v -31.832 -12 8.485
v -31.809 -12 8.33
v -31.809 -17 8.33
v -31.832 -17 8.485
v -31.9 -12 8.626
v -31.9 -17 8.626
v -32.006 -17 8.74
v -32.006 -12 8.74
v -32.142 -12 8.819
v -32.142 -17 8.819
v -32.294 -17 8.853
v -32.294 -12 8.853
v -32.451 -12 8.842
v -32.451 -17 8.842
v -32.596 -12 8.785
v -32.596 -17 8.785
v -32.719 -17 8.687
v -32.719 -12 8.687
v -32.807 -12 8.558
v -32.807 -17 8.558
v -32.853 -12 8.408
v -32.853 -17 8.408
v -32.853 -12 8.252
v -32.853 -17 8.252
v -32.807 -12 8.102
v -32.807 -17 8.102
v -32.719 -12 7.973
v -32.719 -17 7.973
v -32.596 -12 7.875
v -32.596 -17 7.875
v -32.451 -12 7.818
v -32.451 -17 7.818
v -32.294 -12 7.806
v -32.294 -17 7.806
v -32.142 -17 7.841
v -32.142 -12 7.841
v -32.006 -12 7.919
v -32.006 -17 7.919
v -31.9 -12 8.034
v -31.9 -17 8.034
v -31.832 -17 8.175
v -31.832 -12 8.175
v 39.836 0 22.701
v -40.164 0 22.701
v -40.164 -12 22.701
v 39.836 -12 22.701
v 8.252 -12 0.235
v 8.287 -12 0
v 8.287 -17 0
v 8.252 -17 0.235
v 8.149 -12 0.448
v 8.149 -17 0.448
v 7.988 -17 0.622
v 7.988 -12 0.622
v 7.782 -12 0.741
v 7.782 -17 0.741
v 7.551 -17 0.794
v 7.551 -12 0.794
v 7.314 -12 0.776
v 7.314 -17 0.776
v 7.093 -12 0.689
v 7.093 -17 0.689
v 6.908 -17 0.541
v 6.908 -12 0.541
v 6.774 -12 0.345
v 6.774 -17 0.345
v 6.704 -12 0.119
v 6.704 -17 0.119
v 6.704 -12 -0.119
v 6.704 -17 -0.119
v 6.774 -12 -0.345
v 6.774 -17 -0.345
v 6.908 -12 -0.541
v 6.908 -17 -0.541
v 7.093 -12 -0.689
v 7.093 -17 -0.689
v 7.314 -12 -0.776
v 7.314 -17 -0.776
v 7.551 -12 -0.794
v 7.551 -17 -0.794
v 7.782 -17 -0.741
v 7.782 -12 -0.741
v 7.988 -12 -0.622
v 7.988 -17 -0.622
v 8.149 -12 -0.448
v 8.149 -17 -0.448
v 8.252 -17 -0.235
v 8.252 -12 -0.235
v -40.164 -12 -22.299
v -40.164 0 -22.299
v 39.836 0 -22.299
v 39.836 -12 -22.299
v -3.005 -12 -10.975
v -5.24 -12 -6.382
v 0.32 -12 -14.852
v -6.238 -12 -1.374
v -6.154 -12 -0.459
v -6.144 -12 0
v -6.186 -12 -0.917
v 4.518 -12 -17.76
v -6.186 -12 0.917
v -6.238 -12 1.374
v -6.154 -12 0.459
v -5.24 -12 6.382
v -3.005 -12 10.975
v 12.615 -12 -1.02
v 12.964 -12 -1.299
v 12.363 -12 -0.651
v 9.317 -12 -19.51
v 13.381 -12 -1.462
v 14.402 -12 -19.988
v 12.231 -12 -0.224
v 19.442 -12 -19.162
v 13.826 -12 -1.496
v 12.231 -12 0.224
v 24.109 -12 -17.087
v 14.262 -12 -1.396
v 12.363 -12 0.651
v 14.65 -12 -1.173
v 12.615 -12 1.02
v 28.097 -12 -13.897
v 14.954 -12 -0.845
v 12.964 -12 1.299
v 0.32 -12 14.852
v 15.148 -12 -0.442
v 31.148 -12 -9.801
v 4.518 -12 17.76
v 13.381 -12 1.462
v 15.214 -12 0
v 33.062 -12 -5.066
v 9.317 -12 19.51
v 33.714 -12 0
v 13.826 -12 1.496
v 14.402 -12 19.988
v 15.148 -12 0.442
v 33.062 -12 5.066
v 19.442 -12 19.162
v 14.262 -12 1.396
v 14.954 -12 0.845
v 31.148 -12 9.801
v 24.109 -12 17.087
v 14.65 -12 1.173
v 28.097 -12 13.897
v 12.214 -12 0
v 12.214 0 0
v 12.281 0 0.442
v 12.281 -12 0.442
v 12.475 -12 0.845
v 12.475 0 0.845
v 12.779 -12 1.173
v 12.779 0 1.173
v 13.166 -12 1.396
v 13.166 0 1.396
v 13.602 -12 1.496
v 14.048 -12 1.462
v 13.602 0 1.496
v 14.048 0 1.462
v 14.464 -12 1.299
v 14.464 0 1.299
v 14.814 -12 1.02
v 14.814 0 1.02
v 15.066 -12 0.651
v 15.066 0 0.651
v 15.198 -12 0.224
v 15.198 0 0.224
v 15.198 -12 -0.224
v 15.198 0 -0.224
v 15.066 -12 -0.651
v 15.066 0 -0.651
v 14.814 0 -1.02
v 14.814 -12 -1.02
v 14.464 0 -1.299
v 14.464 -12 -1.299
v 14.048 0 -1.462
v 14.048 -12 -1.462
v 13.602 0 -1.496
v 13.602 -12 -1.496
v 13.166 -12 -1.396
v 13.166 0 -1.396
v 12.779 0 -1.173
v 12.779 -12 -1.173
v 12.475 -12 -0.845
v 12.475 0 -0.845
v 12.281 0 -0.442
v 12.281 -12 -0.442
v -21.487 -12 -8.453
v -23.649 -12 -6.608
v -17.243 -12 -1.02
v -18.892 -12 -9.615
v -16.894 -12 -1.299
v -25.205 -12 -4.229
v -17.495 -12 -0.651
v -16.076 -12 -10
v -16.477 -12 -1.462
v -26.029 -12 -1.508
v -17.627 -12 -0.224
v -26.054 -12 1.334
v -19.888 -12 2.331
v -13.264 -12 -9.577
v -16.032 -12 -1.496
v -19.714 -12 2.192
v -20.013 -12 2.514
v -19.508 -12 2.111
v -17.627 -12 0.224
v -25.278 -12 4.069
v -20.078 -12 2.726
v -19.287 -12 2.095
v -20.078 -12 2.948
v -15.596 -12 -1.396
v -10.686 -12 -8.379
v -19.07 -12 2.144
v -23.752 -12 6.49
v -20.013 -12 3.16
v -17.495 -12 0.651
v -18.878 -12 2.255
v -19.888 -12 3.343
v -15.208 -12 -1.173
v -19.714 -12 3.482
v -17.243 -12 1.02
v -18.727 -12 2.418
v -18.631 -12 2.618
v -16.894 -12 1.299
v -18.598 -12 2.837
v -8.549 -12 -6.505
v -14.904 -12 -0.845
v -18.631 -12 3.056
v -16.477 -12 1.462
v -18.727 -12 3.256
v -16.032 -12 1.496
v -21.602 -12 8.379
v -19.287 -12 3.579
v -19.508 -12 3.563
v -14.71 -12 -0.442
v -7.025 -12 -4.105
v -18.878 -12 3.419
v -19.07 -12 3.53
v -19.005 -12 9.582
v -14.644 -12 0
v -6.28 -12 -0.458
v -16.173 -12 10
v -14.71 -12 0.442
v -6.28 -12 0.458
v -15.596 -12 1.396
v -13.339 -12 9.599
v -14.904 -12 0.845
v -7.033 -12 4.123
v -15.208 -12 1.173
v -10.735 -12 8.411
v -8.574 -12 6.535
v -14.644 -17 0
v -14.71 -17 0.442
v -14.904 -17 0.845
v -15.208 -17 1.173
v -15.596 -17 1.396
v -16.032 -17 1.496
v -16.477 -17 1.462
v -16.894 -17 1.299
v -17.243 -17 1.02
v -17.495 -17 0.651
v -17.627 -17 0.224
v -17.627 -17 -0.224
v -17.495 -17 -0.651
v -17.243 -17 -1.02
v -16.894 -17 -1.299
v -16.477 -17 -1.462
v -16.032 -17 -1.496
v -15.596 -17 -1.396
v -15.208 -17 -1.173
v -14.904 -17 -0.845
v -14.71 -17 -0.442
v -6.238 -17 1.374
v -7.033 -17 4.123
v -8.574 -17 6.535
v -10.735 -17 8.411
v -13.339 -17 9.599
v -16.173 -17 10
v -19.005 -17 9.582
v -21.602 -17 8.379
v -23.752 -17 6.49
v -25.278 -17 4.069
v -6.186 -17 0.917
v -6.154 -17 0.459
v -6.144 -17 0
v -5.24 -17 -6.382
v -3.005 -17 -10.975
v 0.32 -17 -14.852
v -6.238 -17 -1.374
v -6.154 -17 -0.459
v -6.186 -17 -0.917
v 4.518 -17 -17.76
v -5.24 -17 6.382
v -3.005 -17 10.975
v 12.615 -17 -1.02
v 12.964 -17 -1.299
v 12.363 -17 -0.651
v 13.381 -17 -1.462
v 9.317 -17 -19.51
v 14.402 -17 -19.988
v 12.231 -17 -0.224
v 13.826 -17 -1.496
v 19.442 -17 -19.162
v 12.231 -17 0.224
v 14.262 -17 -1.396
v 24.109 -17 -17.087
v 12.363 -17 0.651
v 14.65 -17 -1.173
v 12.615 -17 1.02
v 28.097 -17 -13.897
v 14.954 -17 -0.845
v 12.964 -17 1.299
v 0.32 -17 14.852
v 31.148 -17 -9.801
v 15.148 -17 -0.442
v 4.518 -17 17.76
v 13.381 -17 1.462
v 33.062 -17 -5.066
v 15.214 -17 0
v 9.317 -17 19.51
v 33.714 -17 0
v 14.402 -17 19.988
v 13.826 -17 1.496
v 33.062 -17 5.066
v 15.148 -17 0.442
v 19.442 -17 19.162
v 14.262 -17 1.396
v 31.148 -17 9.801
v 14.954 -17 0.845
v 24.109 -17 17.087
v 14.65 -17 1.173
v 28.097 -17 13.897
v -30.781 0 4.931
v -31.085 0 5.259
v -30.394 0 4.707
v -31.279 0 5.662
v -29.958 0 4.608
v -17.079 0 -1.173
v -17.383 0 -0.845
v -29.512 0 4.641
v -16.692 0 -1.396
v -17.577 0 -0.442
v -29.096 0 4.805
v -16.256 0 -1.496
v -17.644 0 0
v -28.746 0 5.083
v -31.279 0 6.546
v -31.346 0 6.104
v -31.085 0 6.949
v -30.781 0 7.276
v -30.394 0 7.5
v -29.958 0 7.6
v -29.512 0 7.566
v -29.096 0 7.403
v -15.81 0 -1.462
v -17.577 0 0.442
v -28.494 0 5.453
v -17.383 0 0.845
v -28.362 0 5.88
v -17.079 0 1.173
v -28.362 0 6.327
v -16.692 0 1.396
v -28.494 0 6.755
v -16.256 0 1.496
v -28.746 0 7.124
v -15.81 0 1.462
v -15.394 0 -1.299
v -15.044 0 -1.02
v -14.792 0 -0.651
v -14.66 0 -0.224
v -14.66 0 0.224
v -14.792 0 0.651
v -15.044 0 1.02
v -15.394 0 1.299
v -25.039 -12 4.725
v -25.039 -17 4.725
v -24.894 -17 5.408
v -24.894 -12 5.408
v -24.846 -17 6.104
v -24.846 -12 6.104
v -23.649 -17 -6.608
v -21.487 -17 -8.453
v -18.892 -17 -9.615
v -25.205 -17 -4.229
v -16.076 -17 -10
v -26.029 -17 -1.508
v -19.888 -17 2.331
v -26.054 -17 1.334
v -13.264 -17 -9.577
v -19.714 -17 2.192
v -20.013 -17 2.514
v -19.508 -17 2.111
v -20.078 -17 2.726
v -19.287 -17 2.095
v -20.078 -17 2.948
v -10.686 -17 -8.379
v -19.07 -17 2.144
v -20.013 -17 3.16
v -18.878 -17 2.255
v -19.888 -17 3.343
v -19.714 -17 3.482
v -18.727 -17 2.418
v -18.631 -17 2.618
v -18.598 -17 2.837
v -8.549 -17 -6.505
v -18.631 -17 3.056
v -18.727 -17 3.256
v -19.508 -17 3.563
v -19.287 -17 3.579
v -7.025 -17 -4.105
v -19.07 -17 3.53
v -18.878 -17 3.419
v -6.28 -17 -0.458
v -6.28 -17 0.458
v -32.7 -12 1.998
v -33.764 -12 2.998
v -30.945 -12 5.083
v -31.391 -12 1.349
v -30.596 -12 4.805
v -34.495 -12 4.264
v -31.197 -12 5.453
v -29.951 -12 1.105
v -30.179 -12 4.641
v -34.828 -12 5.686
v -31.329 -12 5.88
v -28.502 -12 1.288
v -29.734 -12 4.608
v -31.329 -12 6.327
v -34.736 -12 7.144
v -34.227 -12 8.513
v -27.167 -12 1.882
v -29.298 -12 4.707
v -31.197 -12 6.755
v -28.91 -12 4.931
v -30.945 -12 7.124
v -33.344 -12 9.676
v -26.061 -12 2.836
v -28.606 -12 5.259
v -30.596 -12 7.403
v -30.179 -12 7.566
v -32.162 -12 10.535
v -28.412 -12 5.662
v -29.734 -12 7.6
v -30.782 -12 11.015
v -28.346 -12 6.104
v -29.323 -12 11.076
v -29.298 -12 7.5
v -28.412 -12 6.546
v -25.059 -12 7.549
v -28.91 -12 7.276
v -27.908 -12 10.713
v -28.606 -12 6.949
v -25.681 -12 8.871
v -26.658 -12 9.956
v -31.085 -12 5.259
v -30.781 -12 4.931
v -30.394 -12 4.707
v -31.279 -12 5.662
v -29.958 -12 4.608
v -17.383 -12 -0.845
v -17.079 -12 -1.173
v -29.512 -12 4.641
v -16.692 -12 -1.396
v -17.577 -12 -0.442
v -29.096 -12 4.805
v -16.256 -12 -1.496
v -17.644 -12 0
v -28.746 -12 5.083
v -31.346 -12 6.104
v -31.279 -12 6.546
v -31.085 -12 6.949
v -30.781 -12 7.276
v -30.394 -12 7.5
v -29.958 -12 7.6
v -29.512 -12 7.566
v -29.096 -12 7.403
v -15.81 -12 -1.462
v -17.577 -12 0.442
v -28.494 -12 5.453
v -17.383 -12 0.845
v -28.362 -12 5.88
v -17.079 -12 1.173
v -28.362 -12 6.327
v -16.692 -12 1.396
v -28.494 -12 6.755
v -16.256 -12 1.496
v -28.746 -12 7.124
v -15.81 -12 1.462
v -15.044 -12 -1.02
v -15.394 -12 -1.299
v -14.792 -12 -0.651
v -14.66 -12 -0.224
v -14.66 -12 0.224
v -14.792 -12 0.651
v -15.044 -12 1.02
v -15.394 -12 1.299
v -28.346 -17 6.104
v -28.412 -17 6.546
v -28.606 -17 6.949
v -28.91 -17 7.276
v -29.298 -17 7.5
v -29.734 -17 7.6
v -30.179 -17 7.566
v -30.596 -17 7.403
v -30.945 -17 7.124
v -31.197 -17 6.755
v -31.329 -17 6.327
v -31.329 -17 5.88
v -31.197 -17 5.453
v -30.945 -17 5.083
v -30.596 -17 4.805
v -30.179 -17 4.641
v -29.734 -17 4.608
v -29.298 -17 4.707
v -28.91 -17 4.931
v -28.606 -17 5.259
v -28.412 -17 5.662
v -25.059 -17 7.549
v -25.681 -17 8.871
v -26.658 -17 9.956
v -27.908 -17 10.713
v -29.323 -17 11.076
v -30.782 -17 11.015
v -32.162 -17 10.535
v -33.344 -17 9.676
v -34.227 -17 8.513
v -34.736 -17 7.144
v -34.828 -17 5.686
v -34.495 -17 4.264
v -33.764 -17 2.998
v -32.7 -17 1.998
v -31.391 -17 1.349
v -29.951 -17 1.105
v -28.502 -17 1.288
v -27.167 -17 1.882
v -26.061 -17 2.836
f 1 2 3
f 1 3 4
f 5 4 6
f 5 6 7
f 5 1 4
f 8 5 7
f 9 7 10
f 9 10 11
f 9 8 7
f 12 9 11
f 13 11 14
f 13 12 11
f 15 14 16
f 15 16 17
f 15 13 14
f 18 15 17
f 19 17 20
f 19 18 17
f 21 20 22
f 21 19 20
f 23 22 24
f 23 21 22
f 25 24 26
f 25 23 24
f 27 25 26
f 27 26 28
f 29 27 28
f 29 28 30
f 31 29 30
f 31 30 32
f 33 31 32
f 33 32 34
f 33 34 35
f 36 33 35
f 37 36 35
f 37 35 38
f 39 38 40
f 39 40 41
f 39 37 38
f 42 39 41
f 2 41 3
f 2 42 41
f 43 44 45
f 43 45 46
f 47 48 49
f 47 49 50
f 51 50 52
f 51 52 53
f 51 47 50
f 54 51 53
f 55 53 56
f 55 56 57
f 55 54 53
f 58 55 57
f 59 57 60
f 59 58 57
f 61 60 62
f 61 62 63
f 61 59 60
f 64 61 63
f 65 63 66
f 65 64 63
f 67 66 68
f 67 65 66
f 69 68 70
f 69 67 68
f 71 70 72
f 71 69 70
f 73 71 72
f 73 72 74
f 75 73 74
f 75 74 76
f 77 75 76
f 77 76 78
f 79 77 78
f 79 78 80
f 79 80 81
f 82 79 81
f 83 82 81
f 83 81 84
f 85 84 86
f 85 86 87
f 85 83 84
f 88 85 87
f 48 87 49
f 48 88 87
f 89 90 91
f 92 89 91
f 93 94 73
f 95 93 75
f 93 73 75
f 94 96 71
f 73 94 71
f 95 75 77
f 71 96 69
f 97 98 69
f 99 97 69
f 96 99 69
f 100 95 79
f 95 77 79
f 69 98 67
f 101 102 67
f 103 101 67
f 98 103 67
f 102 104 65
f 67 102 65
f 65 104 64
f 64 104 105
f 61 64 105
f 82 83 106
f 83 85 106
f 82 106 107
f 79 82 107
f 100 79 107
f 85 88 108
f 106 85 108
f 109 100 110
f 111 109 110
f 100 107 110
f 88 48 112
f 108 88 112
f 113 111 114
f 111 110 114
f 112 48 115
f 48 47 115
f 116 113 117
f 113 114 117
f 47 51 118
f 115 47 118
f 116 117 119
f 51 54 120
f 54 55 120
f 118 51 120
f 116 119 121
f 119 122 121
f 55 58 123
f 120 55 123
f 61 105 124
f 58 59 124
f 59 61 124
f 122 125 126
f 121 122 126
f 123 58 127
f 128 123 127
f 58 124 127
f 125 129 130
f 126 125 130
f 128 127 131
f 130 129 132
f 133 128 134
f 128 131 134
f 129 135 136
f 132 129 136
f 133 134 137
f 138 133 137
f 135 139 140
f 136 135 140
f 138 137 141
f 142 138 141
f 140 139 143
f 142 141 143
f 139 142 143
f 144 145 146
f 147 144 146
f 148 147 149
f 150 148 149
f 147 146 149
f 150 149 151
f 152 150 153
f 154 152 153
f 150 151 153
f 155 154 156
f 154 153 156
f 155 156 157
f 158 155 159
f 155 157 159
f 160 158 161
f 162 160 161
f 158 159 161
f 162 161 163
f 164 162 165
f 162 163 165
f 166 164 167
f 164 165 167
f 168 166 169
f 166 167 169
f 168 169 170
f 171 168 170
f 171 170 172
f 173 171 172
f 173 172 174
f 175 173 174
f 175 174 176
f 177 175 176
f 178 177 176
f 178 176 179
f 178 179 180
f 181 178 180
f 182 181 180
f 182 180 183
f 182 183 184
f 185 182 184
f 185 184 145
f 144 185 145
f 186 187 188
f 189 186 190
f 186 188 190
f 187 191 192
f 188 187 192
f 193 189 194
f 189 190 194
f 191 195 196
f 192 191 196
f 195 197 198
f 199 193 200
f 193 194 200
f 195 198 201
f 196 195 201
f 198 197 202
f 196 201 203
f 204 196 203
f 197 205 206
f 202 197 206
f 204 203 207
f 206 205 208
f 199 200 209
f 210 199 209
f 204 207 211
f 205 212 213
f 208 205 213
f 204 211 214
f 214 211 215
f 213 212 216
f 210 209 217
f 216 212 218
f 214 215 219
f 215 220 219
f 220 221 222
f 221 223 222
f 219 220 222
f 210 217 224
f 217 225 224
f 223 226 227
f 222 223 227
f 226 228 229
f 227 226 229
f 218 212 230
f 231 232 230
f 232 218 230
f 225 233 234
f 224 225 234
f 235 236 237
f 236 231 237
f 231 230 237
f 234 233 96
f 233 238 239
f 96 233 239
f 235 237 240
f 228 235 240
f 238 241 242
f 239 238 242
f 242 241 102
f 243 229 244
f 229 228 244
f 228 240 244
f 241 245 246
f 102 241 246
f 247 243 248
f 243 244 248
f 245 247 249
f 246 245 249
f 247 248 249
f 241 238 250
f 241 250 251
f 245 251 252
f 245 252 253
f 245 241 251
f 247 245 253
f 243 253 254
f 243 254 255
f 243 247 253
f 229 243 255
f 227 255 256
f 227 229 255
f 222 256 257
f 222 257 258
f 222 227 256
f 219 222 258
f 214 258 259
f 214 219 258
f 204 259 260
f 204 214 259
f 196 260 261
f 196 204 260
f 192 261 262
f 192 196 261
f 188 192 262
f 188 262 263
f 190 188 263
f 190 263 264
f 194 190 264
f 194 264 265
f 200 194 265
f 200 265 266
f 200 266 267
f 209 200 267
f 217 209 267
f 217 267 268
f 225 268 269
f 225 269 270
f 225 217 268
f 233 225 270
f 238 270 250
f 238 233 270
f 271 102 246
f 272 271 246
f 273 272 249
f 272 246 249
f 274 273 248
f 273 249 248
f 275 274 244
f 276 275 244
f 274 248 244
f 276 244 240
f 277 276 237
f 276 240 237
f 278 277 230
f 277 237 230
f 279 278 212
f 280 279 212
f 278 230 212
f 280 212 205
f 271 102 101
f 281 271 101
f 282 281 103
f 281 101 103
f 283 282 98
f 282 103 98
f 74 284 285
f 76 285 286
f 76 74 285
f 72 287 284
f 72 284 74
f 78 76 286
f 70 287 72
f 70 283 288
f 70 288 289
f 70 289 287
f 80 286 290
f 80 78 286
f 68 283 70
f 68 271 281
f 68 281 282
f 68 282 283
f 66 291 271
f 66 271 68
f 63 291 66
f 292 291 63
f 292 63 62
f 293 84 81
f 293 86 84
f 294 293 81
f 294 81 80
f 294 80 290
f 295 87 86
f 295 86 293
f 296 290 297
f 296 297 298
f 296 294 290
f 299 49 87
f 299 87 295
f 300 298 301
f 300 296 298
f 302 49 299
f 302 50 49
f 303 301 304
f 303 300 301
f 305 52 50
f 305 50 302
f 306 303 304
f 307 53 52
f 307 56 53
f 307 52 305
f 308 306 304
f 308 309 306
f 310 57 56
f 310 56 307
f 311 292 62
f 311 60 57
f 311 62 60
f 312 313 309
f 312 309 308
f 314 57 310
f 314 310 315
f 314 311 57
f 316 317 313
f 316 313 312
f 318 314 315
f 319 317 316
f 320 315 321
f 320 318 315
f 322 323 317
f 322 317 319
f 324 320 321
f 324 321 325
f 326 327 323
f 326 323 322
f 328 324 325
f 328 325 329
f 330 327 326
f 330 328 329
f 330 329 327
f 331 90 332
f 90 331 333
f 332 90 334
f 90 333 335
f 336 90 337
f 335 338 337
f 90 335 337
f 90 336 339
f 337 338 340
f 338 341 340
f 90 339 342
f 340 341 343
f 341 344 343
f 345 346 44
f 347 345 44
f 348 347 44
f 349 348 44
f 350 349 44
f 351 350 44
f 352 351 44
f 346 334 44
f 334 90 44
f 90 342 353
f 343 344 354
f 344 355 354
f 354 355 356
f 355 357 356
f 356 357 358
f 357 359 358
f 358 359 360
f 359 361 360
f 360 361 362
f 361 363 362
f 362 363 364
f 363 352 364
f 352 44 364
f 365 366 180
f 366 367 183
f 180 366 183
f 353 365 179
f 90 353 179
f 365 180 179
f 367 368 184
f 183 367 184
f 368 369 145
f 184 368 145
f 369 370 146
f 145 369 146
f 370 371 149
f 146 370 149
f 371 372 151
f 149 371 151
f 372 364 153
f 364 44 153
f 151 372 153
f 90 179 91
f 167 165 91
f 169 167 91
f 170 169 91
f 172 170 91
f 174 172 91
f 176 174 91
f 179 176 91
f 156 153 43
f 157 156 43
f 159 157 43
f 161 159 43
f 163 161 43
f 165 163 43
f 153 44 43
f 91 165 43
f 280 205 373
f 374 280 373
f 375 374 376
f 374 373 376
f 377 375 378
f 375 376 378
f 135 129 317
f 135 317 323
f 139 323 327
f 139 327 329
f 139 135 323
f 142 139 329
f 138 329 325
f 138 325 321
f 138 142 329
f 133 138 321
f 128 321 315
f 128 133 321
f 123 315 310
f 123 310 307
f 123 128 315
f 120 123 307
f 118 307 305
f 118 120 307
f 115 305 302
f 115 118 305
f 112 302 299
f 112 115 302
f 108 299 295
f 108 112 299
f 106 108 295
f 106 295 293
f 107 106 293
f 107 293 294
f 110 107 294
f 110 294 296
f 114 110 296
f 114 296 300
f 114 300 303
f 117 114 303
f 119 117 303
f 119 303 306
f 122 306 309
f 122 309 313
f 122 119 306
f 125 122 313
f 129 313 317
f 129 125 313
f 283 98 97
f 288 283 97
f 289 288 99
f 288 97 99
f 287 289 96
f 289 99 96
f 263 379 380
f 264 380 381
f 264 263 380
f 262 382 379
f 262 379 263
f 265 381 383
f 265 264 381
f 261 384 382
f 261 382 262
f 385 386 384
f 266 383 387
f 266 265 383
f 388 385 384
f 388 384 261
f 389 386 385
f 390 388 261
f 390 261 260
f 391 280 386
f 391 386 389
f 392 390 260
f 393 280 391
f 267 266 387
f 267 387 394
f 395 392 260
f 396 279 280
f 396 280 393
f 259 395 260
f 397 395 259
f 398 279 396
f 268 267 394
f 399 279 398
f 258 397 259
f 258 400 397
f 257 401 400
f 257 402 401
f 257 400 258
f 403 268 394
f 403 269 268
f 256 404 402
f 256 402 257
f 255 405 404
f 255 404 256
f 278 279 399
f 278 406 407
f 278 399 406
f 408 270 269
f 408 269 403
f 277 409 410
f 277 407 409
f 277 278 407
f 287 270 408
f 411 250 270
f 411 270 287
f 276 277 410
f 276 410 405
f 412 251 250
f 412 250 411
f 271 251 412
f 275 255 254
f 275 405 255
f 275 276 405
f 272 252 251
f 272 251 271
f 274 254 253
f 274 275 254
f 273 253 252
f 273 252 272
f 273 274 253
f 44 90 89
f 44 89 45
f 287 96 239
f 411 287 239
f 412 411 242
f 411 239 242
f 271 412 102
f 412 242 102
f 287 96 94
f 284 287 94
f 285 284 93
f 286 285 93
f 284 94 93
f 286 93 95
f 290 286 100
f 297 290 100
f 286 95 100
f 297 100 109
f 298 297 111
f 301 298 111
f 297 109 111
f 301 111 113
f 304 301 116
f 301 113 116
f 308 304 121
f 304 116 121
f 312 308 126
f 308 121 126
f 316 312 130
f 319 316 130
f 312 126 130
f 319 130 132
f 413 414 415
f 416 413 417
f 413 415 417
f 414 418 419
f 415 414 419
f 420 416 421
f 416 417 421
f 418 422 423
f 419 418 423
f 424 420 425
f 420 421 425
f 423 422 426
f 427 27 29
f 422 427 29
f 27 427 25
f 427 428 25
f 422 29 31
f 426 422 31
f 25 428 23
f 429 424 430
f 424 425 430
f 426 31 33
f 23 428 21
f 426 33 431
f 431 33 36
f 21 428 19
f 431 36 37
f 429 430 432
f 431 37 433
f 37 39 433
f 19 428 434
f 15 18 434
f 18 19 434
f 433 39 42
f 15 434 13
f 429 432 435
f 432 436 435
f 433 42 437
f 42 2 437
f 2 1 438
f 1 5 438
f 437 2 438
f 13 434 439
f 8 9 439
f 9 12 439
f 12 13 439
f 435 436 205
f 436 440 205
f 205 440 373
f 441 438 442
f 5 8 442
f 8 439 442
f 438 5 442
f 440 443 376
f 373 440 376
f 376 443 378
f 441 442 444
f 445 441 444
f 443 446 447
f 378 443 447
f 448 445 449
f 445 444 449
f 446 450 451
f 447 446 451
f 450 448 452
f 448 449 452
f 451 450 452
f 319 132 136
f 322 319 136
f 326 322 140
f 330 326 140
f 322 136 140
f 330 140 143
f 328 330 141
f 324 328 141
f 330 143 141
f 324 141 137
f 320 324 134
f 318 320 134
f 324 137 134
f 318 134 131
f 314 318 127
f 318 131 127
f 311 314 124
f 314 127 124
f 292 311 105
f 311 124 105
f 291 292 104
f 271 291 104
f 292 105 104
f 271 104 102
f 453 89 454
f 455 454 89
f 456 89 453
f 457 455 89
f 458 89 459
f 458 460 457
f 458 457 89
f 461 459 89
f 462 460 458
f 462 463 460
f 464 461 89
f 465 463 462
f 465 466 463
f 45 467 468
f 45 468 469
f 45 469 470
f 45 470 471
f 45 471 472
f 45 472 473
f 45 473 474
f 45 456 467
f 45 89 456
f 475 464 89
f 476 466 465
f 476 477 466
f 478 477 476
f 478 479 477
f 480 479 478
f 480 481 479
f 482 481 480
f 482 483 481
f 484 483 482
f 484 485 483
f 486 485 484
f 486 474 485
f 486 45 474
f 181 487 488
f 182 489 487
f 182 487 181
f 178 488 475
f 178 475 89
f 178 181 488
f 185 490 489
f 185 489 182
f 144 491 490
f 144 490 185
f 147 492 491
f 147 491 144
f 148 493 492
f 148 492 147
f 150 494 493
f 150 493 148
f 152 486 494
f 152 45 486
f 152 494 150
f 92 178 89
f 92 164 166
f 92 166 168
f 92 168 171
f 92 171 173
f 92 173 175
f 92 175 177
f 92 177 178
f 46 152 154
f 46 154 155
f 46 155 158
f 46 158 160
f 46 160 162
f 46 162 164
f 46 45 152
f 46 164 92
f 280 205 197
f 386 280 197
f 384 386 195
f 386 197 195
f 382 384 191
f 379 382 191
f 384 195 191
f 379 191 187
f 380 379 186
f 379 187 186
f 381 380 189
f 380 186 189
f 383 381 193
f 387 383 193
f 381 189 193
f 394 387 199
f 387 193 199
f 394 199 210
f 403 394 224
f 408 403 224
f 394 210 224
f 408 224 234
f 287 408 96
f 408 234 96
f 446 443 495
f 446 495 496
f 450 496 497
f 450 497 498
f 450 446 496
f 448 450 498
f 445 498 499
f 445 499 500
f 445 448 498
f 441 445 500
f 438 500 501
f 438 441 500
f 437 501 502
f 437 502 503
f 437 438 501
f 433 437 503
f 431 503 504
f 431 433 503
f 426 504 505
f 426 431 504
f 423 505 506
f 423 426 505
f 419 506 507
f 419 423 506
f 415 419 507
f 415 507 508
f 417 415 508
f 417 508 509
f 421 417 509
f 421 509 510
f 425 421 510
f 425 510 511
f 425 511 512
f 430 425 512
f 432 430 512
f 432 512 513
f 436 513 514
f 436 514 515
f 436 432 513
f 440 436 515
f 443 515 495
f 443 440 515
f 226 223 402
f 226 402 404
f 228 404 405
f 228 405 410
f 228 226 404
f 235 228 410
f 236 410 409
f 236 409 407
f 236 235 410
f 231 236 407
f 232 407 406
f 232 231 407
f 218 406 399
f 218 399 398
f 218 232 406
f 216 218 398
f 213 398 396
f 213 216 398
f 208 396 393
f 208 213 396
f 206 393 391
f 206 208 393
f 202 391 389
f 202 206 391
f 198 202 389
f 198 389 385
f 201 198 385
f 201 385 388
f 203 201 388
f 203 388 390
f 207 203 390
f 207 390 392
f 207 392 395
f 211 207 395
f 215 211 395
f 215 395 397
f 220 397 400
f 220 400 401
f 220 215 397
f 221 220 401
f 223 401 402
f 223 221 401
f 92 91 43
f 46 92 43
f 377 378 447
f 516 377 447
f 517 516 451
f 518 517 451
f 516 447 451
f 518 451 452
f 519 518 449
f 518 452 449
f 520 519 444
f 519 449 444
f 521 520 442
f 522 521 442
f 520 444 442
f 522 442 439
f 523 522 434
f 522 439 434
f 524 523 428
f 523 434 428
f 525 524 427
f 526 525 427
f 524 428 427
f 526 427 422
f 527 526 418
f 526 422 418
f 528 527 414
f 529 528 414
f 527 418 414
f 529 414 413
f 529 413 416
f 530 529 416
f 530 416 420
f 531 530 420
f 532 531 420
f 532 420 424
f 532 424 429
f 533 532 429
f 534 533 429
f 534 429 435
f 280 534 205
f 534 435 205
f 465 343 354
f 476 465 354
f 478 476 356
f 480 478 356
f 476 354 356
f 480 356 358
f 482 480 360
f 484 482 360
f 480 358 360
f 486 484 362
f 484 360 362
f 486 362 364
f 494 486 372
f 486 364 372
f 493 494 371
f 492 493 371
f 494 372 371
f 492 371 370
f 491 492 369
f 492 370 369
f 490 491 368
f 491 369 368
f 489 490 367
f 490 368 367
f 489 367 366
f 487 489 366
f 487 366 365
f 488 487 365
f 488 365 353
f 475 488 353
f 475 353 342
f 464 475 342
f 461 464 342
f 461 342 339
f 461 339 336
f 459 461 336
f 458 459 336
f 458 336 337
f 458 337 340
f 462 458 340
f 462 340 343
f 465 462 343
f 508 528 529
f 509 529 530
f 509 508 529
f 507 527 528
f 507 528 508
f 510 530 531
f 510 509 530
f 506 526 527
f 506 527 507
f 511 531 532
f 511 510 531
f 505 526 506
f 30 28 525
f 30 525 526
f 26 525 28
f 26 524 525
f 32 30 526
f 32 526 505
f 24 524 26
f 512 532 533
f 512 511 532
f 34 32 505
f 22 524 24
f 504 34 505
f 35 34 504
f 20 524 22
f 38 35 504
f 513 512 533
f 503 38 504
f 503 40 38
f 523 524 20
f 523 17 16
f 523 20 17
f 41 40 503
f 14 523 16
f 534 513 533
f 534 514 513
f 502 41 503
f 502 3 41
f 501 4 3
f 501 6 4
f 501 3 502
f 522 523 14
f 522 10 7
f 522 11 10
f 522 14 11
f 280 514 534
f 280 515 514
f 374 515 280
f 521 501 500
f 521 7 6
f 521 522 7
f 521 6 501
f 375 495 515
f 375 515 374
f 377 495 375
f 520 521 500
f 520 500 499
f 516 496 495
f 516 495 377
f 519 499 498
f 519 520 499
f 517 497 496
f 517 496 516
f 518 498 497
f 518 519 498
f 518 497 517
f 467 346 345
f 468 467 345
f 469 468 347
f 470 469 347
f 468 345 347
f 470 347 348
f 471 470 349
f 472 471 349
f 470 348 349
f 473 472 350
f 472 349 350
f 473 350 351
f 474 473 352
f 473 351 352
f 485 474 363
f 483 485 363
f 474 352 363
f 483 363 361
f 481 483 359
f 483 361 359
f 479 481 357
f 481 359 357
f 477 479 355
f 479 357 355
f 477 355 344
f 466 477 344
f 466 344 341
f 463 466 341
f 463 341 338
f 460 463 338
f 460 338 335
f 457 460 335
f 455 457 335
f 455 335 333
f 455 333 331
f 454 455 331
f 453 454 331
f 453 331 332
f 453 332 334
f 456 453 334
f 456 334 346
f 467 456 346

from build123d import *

# Parameters (mm, degrees)
F0_W     = 80
F0_H     = 45
F1_DEPTH = 12
F2_R     = 0.796032
F2_R_2   = 1.5
F2_R_3   = 0.744286
F2_R_4   = 0.525133
F3_DEPTH = 5
F4_D     = 3
F5_D     = 3
F6_D     = 3


with BuildPart() as f1:
    # F0 (on Front) → F1 (new body)
    with BuildSketch(Plane.XZ):
        with Locations((-0.163622, 0.20093)):
            Rectangle(F0_W, F0_H)
    extrude(amount=F1_DEPTH)

    # F4 (through all)
    with Locations(Plane.XZ.offset(12)):
        with Locations((13.714387, 0)):
            Hole(F4_D / 2)

    # F5 (through all)
    with Locations(Plane.XZ.offset(12)):
        with Locations((-16.1436, 0)):
            Hole(F5_D / 2)

    # F6 (through all)
    with Locations(Plane.XZ.offset(12)):
        with Locations((-29.845599, 6.103707)):
            Hole(F6_D / 2)


with BuildPart() as f3:
    # F2 (on face) → F3 (new body)
    with BuildSketch(Plane.XZ.offset(12)):
        with BuildLine():
            ThreePointArc((-6.238388, -1.373597), (14.401591, -19.98819), (33.714387, 0))
            ThreePointArc((33.714387, 0), (14.401591, 19.98819), (-6.238388, 1.373597))
            ThreePointArc((-6.238388, 1.373597), (-6.167326, 0.688432), (-6.1436, 0))
            ThreePointArc((-6.1436, 0), (-6.167326, -0.688432), (-6.238388, -1.373597))
        make_face()
        with Locations((7.49143, 0)):
            Circle(F2_R, mode=Mode.SUBTRACT)
        with Locations((13.714387, 0)):
            Circle(F2_R_2, mode=Mode.SUBTRACT)
        with BuildLine():
            ThreePointArc((-6.238388, -1.373597), (-6.285613, 0), (-6.238388, 1.373597))
            ThreePointArc((-6.238388, 1.373597), (-14.741844, 9.901267), (-25.278266, 4.069138))
            ThreePointArc((-25.278266, 4.069138), (-18.892105, -9.61487), (-6.238388, -1.373597))
        make_face()
        with Locations((-16.1436, 0)):
            Circle(F2_R_2, mode=Mode.SUBTRACT)
        with Locations((-19.342253, 2.836976)):
            Circle(F2_R_3, mode=Mode.SUBTRACT)
        with BuildLine():
            ThreePointArc((-24.845599, 6.103707), (-34.736236, 7.14374), (-25.278266, 4.069138))
            ThreePointArc((-25.278266, 4.069138), (-24.954961, 5.063675), (-24.845599, 6.103707))
        make_face()
        with Locations((-32.333657, 8.329799)):
            Circle(F2_R_4, mode=Mode.SUBTRACT)
        with Locations((-29.845599, 6.103707)):
            Circle(F2_R_2, mode=Mode.SUBTRACT)
    extrude(amount=F3_DEPTH)


solid = Compound([f1.part, f3.part])
